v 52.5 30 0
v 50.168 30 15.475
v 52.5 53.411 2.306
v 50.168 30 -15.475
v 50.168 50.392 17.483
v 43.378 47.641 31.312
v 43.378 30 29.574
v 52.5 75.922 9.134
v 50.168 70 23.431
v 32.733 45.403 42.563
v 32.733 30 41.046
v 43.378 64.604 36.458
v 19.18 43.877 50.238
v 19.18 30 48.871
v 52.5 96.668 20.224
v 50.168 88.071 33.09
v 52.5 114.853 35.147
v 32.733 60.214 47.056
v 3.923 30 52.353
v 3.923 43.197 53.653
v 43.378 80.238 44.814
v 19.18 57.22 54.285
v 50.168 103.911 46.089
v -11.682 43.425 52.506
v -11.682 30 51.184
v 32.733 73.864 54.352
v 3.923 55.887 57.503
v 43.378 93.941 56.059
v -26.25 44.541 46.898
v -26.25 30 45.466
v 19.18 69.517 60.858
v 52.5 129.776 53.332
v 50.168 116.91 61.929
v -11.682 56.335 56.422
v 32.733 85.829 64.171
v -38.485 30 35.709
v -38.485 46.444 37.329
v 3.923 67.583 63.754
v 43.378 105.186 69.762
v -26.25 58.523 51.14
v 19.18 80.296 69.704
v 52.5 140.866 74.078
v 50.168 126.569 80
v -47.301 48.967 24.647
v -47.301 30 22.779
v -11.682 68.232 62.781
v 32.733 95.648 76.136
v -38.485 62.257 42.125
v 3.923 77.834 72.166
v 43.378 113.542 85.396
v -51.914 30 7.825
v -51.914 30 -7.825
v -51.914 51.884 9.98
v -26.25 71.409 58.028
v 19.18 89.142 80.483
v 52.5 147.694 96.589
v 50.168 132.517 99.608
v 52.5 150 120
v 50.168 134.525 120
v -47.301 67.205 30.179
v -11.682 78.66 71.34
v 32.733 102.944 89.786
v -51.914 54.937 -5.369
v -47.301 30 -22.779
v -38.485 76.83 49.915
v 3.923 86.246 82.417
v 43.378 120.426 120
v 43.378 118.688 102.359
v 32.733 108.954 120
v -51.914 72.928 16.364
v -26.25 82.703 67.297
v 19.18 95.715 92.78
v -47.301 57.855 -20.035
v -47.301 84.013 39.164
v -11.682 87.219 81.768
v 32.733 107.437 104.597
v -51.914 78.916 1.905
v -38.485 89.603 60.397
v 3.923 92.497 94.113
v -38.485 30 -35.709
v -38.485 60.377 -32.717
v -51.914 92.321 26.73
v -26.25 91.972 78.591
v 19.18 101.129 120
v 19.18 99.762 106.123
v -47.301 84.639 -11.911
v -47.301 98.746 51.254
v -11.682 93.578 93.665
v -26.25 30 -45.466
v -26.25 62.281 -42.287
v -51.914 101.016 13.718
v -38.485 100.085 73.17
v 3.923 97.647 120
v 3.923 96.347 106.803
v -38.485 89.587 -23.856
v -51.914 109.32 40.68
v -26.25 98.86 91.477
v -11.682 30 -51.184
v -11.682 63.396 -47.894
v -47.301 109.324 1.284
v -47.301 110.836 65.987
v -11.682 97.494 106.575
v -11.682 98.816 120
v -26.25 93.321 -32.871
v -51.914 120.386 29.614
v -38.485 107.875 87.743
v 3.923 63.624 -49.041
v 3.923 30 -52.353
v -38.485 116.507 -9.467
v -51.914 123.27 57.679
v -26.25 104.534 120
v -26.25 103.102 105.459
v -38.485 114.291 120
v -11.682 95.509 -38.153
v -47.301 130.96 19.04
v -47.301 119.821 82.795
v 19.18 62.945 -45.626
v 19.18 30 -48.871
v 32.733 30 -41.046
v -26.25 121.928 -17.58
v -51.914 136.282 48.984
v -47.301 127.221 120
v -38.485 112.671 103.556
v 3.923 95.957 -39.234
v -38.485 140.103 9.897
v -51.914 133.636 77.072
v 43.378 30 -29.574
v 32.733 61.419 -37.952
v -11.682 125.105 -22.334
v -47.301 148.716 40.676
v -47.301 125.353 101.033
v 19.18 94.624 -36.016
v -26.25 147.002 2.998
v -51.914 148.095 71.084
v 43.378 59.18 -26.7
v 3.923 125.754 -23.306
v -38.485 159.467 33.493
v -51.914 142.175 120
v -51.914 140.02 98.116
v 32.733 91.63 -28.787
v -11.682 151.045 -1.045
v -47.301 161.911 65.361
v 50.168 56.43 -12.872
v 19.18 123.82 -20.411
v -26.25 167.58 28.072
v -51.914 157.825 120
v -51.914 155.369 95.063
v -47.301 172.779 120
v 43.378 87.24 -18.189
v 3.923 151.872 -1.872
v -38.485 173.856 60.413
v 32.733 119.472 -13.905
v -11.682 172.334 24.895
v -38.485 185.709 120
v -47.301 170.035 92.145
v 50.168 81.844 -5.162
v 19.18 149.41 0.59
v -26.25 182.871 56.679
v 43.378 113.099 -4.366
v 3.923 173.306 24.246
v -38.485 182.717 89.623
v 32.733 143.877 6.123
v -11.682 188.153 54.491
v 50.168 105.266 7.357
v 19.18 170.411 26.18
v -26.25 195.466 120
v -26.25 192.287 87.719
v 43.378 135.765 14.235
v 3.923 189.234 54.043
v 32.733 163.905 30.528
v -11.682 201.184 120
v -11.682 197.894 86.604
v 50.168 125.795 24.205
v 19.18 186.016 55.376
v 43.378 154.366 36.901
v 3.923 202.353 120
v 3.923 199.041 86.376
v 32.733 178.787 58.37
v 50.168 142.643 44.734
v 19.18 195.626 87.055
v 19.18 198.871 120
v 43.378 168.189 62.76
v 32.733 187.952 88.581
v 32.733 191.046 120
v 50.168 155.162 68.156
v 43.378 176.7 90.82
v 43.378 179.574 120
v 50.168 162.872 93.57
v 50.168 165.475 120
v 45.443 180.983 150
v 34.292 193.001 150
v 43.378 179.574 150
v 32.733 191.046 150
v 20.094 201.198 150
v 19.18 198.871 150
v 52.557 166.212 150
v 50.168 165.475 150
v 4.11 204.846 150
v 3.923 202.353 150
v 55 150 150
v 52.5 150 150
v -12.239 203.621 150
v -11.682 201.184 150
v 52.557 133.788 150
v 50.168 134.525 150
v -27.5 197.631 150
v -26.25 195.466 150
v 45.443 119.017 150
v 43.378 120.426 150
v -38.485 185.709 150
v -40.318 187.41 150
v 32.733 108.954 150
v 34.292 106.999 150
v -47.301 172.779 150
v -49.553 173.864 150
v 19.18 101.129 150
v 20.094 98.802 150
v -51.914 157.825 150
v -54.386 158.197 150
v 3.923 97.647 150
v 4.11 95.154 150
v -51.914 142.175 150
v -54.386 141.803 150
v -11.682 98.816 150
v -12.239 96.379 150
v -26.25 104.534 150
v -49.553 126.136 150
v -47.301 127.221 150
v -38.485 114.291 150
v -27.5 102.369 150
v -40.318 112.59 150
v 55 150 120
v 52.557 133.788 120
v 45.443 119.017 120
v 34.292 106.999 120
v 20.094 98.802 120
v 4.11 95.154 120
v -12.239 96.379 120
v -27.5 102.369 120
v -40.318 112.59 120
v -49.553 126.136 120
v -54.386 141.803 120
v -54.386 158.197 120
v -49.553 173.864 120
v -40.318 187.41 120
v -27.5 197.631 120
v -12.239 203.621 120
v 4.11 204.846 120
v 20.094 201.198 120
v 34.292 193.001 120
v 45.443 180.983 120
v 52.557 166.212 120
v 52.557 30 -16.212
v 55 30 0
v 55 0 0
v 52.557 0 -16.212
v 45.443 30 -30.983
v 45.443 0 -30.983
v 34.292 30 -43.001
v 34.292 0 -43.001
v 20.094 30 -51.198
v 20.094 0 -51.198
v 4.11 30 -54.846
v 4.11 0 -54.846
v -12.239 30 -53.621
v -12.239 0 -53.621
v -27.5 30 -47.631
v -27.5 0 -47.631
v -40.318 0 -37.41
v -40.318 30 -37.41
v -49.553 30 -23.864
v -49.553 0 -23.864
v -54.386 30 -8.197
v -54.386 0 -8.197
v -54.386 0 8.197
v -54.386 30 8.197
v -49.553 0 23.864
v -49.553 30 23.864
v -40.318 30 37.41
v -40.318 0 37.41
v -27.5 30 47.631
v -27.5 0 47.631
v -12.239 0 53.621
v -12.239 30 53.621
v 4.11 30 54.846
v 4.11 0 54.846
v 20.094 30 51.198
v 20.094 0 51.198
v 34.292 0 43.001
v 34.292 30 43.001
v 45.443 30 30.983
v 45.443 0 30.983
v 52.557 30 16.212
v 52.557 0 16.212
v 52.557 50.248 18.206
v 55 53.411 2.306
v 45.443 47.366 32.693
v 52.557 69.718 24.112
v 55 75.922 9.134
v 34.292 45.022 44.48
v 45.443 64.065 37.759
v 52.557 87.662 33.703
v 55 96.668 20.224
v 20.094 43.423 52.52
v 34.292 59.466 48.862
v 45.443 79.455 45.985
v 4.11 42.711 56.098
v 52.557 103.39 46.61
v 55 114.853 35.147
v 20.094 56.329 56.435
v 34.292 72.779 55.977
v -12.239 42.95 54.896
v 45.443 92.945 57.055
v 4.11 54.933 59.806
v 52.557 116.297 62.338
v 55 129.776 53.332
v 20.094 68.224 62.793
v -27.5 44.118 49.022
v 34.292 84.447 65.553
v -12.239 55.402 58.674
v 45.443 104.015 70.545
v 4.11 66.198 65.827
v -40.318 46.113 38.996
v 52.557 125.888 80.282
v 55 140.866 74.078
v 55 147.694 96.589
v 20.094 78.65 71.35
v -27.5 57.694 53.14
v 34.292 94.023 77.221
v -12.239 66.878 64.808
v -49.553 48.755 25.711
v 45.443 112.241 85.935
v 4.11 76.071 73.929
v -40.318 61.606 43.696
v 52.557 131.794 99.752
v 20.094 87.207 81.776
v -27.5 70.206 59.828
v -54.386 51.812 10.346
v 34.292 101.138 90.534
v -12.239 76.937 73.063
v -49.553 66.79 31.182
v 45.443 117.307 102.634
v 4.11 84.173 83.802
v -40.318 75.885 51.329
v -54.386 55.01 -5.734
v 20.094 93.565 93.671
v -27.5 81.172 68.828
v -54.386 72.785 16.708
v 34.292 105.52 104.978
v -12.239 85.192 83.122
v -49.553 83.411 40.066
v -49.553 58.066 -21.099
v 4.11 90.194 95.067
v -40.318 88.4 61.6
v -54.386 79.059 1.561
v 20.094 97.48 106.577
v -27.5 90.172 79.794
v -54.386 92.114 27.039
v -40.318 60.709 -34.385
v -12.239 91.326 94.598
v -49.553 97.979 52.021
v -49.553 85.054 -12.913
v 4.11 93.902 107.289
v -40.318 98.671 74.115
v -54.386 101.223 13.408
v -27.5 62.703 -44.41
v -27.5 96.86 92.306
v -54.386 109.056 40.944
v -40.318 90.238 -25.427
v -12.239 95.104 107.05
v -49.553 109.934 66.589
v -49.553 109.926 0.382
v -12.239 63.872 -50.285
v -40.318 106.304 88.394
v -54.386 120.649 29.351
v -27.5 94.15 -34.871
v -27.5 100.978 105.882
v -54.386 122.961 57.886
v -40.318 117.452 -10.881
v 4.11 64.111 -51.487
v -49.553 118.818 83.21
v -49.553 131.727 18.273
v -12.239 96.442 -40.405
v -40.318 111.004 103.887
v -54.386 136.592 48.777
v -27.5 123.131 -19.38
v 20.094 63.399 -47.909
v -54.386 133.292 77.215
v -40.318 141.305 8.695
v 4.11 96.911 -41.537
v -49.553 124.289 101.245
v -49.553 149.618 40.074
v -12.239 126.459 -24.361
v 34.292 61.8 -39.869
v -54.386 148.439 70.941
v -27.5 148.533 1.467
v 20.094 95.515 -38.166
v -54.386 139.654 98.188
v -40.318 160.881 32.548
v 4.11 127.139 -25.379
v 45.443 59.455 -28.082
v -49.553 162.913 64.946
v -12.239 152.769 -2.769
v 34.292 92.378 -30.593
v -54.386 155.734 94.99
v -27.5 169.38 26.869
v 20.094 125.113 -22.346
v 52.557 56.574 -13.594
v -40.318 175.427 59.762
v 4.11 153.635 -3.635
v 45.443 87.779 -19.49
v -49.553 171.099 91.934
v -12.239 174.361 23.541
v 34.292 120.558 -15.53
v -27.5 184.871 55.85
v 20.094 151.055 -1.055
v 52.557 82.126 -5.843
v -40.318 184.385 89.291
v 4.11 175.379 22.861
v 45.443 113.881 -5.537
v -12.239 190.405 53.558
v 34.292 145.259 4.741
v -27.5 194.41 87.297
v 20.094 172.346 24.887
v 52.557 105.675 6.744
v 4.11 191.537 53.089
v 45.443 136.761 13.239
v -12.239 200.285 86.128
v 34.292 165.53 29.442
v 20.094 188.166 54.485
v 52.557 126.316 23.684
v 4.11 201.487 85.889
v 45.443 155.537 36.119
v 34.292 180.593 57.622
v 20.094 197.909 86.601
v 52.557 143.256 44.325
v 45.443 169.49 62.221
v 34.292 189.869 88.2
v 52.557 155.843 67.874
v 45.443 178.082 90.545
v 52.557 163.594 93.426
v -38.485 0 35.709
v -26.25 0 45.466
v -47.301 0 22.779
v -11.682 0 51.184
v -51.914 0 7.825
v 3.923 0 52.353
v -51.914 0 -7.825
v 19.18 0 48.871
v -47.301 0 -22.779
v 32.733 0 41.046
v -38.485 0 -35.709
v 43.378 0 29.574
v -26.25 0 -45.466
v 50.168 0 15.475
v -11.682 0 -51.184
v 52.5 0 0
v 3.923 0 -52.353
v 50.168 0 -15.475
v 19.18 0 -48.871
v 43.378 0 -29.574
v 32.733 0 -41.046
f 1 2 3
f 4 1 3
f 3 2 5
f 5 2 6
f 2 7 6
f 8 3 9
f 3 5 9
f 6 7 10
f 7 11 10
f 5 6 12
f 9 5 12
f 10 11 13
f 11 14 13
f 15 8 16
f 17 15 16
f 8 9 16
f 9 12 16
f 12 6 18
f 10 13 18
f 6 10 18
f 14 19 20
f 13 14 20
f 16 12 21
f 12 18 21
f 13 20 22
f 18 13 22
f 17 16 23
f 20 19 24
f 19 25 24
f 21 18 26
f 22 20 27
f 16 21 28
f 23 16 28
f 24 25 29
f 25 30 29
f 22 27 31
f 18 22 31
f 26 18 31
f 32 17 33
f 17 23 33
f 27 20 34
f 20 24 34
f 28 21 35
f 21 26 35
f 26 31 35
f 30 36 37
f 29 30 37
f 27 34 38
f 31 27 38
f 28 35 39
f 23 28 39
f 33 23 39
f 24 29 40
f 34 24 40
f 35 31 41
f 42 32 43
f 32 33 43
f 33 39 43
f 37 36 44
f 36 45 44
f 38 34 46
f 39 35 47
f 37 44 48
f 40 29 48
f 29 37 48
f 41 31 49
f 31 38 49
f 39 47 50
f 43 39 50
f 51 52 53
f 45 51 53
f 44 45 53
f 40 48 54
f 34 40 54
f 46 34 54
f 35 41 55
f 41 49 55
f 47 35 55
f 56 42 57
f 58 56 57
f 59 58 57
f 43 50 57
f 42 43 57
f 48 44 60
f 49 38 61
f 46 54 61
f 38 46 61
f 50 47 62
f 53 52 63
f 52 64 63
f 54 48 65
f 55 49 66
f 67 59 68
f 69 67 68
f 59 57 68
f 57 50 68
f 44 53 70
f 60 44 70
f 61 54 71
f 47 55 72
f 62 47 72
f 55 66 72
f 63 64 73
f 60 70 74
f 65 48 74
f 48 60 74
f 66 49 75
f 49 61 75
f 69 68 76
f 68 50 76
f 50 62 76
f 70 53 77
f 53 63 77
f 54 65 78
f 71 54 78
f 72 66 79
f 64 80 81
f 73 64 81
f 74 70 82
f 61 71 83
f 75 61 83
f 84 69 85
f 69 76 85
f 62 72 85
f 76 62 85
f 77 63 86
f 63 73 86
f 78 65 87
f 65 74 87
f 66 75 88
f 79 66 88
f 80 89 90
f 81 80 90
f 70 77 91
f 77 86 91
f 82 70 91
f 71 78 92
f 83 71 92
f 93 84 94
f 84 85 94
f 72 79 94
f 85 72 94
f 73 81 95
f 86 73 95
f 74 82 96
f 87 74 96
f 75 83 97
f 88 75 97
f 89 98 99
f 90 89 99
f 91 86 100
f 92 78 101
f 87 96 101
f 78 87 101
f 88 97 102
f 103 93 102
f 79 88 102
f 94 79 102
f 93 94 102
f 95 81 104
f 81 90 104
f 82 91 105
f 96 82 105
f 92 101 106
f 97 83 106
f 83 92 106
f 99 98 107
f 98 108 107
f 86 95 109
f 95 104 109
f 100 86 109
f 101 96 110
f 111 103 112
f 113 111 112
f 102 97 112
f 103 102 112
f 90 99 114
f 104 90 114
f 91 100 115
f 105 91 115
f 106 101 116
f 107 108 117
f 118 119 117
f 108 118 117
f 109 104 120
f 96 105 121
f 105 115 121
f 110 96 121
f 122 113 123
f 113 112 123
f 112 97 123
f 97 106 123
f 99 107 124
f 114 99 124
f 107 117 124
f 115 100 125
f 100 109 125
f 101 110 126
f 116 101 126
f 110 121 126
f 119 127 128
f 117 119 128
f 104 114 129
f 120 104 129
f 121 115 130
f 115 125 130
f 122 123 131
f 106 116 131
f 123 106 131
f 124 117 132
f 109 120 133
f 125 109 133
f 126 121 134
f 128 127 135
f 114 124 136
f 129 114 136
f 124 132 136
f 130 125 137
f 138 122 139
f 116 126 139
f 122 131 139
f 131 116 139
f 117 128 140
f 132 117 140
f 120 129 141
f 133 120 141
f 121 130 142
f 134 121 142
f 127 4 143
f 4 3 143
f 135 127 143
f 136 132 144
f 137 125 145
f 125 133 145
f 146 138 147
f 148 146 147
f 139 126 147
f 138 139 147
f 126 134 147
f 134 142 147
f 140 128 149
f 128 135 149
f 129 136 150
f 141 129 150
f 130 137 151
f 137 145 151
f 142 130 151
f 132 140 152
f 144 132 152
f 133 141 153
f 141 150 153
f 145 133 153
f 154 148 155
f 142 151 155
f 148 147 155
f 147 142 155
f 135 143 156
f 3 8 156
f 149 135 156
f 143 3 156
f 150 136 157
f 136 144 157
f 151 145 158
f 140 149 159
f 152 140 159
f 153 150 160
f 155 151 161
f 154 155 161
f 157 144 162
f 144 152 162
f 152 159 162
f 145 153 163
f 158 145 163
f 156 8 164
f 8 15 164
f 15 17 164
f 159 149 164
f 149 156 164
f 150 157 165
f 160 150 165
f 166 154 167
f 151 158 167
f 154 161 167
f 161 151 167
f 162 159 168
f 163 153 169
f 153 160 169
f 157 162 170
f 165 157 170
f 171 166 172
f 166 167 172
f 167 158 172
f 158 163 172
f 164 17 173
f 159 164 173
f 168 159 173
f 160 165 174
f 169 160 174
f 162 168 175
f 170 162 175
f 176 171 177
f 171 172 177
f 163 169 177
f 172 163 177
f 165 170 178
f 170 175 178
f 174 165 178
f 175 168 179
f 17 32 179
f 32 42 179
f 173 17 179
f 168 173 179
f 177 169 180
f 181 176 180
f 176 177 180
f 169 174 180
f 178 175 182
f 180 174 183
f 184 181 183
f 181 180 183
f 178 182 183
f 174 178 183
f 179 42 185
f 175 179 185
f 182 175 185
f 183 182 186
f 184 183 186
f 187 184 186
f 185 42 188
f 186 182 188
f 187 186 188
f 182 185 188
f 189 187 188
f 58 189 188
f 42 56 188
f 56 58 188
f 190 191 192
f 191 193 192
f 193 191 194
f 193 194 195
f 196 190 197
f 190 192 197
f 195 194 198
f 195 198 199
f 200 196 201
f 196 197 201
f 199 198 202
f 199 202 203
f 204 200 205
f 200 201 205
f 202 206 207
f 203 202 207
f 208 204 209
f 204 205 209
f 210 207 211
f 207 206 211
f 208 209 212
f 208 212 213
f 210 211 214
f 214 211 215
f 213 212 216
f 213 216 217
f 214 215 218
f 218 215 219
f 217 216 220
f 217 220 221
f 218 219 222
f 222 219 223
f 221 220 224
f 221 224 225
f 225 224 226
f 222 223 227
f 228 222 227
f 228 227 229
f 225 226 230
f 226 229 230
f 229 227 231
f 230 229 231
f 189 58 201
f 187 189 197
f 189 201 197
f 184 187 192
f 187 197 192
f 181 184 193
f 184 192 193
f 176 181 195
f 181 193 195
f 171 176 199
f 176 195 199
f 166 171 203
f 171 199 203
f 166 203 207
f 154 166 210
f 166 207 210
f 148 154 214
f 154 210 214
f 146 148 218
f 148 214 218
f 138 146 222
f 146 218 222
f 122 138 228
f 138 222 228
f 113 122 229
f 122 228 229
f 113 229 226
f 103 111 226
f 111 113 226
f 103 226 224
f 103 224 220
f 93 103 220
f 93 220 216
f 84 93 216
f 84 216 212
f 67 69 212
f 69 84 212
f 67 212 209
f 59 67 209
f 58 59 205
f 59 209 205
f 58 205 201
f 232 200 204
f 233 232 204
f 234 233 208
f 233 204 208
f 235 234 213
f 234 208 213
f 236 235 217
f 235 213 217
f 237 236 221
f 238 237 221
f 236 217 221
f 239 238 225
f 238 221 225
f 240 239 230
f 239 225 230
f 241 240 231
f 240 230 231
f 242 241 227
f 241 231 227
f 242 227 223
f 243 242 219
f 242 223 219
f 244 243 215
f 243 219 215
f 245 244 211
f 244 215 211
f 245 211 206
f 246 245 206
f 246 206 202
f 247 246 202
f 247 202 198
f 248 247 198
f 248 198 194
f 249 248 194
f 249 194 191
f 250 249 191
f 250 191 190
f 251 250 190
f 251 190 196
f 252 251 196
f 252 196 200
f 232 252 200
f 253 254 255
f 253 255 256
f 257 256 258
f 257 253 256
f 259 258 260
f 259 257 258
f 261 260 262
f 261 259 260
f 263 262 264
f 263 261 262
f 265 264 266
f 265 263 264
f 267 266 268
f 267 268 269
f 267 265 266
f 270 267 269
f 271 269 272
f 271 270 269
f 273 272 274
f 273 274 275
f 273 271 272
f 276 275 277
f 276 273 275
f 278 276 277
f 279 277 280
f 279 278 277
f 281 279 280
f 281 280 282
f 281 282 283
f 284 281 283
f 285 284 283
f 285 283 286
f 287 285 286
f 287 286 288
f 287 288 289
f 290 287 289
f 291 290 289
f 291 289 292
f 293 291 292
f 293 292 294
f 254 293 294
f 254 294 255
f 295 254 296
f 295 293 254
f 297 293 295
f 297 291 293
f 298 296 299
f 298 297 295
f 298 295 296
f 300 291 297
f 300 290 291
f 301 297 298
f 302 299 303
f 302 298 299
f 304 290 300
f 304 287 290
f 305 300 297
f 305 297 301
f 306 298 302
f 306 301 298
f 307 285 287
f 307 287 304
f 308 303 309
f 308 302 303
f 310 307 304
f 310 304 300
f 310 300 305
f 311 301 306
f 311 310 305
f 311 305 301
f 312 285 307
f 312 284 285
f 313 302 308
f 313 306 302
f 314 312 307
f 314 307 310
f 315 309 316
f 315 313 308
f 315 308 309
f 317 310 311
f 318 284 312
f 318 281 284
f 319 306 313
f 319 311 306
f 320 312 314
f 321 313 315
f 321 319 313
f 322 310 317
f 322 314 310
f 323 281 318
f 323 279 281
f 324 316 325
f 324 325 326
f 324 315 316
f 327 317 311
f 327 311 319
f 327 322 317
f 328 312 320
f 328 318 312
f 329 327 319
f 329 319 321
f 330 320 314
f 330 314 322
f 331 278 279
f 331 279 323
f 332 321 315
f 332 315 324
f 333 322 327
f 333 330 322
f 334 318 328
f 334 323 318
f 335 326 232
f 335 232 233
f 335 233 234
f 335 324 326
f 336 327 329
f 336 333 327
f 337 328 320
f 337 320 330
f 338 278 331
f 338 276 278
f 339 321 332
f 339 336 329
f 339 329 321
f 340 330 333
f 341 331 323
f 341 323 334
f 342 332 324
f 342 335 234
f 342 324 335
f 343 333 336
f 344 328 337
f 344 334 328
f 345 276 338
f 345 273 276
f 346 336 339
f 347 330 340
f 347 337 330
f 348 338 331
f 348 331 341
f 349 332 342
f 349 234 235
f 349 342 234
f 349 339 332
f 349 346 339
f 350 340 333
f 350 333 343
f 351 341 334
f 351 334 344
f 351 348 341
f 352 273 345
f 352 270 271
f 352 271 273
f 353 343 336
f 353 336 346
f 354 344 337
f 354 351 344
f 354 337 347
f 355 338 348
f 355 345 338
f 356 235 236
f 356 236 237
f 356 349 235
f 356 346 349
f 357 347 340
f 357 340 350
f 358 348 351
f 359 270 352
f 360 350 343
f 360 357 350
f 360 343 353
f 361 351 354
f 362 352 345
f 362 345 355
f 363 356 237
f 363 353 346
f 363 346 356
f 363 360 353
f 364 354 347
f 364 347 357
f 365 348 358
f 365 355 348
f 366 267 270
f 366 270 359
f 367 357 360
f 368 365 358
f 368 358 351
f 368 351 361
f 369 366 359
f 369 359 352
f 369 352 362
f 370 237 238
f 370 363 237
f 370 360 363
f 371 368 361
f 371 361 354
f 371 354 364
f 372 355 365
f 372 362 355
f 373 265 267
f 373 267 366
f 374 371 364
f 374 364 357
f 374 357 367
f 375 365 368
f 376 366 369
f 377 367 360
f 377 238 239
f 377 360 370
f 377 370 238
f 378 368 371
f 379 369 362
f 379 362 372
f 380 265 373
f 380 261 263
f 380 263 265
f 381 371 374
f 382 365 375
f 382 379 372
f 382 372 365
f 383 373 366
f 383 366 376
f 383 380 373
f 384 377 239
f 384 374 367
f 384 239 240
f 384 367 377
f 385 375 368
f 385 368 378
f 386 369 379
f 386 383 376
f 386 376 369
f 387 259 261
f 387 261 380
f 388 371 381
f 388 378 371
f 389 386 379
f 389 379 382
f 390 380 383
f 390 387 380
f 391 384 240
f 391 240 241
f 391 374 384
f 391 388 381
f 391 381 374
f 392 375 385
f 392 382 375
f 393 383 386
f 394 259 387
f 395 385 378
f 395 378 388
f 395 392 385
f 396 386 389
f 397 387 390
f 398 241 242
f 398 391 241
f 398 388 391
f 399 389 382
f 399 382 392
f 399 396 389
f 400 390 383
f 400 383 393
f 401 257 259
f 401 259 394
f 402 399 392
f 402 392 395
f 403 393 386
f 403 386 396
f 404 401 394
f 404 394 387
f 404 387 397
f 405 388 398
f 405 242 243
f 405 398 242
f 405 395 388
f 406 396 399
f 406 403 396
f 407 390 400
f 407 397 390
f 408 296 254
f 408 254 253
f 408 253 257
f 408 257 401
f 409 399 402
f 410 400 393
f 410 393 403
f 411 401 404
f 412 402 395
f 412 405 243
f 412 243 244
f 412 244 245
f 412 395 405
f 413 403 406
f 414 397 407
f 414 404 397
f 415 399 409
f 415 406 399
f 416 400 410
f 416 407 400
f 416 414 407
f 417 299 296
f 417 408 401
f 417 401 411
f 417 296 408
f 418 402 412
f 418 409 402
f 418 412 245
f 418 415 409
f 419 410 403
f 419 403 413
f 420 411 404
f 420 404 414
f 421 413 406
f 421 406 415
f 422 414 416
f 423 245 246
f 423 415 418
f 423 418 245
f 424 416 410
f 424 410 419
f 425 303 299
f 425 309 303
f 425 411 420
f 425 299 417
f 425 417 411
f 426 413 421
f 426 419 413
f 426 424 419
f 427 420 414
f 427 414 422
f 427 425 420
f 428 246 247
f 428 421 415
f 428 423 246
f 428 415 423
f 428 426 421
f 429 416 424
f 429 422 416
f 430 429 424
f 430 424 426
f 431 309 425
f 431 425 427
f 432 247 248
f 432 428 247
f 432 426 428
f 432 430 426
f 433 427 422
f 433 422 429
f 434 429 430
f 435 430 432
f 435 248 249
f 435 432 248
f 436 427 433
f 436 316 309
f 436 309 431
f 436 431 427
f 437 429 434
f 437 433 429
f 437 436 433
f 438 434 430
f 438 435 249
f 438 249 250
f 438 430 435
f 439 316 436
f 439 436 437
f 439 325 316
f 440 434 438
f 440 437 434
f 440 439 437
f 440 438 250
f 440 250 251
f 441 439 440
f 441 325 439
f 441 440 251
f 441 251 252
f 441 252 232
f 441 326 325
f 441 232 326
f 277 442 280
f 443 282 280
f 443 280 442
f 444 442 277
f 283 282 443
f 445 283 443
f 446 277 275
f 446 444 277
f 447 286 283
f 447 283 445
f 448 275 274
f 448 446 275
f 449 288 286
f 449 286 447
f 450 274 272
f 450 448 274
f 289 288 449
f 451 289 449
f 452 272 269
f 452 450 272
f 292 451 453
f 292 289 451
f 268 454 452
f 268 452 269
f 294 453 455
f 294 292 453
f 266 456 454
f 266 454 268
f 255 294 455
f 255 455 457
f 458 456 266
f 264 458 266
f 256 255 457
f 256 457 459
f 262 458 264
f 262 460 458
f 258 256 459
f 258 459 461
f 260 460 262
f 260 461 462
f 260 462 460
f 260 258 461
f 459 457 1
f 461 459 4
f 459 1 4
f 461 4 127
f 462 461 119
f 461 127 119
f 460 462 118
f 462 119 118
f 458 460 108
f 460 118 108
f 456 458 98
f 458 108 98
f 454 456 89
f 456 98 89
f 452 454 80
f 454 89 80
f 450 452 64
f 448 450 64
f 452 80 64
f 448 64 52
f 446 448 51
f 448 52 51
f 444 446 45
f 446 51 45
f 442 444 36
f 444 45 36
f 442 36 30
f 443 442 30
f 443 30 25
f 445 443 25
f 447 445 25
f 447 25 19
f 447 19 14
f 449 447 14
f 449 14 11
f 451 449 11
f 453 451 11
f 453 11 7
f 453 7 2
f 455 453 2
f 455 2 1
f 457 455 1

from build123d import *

# Parameters (mm, degrees)
F0_R   = 55
F0_R_2 = 52.5


with BuildPart() as f2:
    # F2: sweep along a path in F1
    with BuildLine(Plane.YZ) as f2_path:
        Line((0, 0), (30, 0))
        ThreePointArc((30, 0), (114.852814, 35.147186), (150, 120))
        Line((150, 120), (150, 150))
    # F0 (on Front) → F2 (sweep)
    with BuildSketch(Plane.XZ):
        Circle(F0_R)
        Circle(F0_R_2, mode=Mode.SUBTRACT)
    sweep(path=f2_path.line)


solid = f2.part
